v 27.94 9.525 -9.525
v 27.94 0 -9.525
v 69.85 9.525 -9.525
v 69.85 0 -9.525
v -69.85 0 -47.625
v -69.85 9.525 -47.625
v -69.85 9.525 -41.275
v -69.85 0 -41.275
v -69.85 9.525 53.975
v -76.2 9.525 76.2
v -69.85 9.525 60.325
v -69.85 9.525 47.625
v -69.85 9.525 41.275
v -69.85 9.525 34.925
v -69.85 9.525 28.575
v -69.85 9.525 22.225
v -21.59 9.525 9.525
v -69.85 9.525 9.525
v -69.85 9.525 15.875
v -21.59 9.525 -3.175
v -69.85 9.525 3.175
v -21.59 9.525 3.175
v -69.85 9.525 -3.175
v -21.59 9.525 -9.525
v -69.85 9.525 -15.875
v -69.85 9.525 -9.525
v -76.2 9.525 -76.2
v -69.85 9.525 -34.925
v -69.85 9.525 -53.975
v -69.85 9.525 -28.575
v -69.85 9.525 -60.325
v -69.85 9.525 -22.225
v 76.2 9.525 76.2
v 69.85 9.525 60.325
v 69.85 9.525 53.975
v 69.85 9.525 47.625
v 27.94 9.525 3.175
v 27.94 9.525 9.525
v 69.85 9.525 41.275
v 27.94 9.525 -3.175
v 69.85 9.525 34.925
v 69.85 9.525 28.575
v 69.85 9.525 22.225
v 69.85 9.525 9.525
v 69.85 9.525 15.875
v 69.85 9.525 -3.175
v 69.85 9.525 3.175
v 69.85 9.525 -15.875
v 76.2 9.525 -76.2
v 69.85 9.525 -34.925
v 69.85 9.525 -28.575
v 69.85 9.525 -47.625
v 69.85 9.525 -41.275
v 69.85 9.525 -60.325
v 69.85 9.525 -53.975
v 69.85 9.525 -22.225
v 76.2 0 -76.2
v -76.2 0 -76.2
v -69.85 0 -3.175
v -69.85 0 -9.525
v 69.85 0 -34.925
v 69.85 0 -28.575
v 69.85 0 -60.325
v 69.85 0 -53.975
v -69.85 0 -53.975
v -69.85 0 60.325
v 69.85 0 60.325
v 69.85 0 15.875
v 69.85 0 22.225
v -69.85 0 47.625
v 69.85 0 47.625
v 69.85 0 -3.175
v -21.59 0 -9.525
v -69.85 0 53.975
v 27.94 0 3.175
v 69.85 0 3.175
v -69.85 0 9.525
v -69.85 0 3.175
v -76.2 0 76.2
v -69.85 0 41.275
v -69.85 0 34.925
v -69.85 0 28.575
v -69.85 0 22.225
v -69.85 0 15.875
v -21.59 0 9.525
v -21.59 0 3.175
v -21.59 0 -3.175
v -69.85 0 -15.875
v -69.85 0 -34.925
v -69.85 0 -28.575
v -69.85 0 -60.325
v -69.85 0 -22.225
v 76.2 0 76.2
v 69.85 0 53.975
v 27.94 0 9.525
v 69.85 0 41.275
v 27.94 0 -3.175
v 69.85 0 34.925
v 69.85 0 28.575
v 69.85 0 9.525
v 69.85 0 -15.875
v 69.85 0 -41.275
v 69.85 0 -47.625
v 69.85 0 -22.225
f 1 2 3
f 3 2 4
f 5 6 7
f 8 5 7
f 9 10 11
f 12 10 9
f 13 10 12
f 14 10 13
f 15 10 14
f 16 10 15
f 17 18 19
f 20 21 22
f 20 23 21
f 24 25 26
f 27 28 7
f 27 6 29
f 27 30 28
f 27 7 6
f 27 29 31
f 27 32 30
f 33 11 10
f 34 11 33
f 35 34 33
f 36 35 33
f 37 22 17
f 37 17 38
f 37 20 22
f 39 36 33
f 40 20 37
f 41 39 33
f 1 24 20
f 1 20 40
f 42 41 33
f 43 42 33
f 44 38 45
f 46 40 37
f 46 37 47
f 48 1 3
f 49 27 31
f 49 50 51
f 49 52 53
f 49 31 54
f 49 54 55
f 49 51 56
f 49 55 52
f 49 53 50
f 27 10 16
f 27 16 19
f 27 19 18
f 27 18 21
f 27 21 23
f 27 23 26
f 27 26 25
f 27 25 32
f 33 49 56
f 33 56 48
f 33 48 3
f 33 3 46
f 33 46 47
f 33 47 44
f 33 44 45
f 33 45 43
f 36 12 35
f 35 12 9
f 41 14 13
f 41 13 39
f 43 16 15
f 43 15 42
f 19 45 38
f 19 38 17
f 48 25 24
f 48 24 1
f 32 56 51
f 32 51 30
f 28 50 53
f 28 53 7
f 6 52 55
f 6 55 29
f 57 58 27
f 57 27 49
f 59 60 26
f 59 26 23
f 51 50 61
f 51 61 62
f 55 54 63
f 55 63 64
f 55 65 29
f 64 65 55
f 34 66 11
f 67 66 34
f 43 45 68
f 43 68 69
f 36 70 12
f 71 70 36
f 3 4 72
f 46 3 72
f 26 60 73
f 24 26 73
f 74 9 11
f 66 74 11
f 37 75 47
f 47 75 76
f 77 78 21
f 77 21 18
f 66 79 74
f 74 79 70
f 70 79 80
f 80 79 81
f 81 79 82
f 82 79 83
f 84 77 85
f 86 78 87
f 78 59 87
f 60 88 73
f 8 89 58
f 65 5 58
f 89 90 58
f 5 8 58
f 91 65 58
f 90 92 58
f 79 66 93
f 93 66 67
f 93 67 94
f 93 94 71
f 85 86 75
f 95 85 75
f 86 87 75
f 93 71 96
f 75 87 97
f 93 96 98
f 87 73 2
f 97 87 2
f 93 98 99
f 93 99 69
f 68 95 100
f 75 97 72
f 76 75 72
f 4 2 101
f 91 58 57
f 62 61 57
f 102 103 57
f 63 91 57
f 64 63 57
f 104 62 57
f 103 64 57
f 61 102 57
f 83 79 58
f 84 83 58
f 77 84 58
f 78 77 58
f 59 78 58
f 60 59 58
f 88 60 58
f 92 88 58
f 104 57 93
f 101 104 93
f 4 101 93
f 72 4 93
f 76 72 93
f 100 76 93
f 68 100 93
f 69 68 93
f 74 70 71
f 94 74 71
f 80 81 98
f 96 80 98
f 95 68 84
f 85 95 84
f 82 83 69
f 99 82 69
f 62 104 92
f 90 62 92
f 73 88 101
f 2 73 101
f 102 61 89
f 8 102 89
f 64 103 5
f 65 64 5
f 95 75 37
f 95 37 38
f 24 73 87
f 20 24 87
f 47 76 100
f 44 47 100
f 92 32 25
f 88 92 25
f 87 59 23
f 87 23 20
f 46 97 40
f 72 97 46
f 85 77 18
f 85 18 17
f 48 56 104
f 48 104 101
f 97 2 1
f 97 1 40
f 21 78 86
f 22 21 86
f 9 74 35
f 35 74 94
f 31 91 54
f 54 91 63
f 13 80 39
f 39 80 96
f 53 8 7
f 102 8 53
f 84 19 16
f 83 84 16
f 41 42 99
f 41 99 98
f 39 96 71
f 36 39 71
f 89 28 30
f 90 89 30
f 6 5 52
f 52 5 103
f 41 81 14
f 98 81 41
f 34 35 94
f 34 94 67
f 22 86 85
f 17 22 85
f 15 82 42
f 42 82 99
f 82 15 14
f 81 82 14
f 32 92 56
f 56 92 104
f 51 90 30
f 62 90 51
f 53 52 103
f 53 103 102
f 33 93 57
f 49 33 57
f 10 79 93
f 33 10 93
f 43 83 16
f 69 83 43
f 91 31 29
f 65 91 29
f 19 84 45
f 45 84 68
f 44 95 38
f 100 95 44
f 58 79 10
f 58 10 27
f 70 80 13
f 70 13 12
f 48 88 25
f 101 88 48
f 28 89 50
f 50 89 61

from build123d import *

# Parameters (mm, degrees)
SKETCH1_W           = 152.4
SKETCH1_H           = 152.4
BOSS_EXTRUDE1_DEPTH = 9.525
SKETCH2_W           = 139.7
SKETCH2_H           = 6.35
CUT_EXTRUDE1_DEPTH  = 10.525
LPATTERN1_COUNT     = 10
LPATTERN1_PITCH     = 12.7
SKETCH3_W           = 48.26
SKETCH3_H           = 6.35
SKETCH3_W_2         = 41.91
CUT_EXTRUDE2_DEPTH  = 9.525
LPATTERN2_COUNT     = 2
LPATTERN2_PITCH     = 12.7


with BuildPart() as part:
    # Sketch1 → Boss-Extrude1 (new body)
    with BuildSketch(Plane(origin=(0, 0, 0), x_dir=(1, 0, 0), z_dir=(0, 1, 0))):
        Rectangle(SKETCH1_W, SKETCH1_H)
    extrude(amount=BOSS_EXTRUDE1_DEPTH)

    # Sketch2 → Cut-Extrude1 (cut, through all)
    with BuildSketch(Plane.XZ):
        with Locations((0, 57.15)):
            Rectangle(SKETCH2_W, SKETCH2_H)
    cut_extrude1 = extrude(amount=-CUT_EXTRUDE1_DEPTH, mode=Mode.SUBTRACT)

    # LPattern1: Cut-Extrude1 ×10, 2 skipped
    with Locations(*[(0, 0, -i * LPATTERN1_PITCH) for i in range(1, LPATTERN1_COUNT) if i not in (4, 5)]):
        add(cut_extrude1, mode=Mode.SUBTRACT)

    # Sketch3 → Cut-Extrude2 (cut)
    with BuildSketch(Plane.XZ):
        with Locations((-45.72, 6.35)):
            Rectangle(SKETCH3_W, SKETCH3_H)
        with Locations((48.895, 6.35)):
            Rectangle(SKETCH3_W_2, SKETCH3_H)
    cut_extrude2 = extrude(amount=-CUT_EXTRUDE2_DEPTH, mode=Mode.SUBTRACT)

    # LPattern2: Cut-Extrude2 ×2
    with Locations(*[(0, 0, -i * LPATTERN2_PITCH) for i in range(1, LPATTERN2_COUNT)]):
        add(cut_extrude2, mode=Mode.SUBTRACT)


solid = part.part
